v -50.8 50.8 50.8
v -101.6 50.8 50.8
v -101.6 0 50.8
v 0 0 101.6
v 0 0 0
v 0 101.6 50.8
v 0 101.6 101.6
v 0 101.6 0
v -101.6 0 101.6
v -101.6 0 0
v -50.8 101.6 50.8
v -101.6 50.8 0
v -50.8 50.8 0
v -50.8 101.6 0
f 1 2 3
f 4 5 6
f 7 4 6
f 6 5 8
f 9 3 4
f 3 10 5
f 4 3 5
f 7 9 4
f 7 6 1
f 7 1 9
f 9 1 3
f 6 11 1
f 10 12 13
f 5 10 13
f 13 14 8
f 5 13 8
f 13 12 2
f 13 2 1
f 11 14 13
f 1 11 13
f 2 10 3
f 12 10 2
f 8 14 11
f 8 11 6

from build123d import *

# Parameters (mm, degrees)
F1_DEPTH = 101.6
F2_W     = 101.6
F2_H     = 101.6
F3_DEPTH = 50.8
F4_W     = 50.8
F4_H     = 50.8
F5_DEPTH = 101.601


with BuildPart() as f1:
    # F0 (on Top) → F1 (new body)
    with BuildSketch(Plane.XY):
        Polygon((-101.6, 0), (0, 0), (0, 101.6), align=None)
    extrude(amount=F1_DEPTH)

    # F2 (on Top) → F3 (join)
    with BuildSketch(Plane.XY):
        with Locations((-50.8, 50.8)):
            Rectangle(F2_W, F2_H)
    extrude(amount=F3_DEPTH)

    # F4 (on face) → F5 (cut, through all)
    with BuildSketch(Plane(origin=(0, 0, 0), x_dir=(1, 0, 0), z_dir=(0, 0, -1))):
        with Locations((-76.2, -76.2)):
            Rectangle(F4_W, F4_H)
    extrude(amount=-F5_DEPTH, mode=Mode.SUBTRACT)


solid = f1.part
